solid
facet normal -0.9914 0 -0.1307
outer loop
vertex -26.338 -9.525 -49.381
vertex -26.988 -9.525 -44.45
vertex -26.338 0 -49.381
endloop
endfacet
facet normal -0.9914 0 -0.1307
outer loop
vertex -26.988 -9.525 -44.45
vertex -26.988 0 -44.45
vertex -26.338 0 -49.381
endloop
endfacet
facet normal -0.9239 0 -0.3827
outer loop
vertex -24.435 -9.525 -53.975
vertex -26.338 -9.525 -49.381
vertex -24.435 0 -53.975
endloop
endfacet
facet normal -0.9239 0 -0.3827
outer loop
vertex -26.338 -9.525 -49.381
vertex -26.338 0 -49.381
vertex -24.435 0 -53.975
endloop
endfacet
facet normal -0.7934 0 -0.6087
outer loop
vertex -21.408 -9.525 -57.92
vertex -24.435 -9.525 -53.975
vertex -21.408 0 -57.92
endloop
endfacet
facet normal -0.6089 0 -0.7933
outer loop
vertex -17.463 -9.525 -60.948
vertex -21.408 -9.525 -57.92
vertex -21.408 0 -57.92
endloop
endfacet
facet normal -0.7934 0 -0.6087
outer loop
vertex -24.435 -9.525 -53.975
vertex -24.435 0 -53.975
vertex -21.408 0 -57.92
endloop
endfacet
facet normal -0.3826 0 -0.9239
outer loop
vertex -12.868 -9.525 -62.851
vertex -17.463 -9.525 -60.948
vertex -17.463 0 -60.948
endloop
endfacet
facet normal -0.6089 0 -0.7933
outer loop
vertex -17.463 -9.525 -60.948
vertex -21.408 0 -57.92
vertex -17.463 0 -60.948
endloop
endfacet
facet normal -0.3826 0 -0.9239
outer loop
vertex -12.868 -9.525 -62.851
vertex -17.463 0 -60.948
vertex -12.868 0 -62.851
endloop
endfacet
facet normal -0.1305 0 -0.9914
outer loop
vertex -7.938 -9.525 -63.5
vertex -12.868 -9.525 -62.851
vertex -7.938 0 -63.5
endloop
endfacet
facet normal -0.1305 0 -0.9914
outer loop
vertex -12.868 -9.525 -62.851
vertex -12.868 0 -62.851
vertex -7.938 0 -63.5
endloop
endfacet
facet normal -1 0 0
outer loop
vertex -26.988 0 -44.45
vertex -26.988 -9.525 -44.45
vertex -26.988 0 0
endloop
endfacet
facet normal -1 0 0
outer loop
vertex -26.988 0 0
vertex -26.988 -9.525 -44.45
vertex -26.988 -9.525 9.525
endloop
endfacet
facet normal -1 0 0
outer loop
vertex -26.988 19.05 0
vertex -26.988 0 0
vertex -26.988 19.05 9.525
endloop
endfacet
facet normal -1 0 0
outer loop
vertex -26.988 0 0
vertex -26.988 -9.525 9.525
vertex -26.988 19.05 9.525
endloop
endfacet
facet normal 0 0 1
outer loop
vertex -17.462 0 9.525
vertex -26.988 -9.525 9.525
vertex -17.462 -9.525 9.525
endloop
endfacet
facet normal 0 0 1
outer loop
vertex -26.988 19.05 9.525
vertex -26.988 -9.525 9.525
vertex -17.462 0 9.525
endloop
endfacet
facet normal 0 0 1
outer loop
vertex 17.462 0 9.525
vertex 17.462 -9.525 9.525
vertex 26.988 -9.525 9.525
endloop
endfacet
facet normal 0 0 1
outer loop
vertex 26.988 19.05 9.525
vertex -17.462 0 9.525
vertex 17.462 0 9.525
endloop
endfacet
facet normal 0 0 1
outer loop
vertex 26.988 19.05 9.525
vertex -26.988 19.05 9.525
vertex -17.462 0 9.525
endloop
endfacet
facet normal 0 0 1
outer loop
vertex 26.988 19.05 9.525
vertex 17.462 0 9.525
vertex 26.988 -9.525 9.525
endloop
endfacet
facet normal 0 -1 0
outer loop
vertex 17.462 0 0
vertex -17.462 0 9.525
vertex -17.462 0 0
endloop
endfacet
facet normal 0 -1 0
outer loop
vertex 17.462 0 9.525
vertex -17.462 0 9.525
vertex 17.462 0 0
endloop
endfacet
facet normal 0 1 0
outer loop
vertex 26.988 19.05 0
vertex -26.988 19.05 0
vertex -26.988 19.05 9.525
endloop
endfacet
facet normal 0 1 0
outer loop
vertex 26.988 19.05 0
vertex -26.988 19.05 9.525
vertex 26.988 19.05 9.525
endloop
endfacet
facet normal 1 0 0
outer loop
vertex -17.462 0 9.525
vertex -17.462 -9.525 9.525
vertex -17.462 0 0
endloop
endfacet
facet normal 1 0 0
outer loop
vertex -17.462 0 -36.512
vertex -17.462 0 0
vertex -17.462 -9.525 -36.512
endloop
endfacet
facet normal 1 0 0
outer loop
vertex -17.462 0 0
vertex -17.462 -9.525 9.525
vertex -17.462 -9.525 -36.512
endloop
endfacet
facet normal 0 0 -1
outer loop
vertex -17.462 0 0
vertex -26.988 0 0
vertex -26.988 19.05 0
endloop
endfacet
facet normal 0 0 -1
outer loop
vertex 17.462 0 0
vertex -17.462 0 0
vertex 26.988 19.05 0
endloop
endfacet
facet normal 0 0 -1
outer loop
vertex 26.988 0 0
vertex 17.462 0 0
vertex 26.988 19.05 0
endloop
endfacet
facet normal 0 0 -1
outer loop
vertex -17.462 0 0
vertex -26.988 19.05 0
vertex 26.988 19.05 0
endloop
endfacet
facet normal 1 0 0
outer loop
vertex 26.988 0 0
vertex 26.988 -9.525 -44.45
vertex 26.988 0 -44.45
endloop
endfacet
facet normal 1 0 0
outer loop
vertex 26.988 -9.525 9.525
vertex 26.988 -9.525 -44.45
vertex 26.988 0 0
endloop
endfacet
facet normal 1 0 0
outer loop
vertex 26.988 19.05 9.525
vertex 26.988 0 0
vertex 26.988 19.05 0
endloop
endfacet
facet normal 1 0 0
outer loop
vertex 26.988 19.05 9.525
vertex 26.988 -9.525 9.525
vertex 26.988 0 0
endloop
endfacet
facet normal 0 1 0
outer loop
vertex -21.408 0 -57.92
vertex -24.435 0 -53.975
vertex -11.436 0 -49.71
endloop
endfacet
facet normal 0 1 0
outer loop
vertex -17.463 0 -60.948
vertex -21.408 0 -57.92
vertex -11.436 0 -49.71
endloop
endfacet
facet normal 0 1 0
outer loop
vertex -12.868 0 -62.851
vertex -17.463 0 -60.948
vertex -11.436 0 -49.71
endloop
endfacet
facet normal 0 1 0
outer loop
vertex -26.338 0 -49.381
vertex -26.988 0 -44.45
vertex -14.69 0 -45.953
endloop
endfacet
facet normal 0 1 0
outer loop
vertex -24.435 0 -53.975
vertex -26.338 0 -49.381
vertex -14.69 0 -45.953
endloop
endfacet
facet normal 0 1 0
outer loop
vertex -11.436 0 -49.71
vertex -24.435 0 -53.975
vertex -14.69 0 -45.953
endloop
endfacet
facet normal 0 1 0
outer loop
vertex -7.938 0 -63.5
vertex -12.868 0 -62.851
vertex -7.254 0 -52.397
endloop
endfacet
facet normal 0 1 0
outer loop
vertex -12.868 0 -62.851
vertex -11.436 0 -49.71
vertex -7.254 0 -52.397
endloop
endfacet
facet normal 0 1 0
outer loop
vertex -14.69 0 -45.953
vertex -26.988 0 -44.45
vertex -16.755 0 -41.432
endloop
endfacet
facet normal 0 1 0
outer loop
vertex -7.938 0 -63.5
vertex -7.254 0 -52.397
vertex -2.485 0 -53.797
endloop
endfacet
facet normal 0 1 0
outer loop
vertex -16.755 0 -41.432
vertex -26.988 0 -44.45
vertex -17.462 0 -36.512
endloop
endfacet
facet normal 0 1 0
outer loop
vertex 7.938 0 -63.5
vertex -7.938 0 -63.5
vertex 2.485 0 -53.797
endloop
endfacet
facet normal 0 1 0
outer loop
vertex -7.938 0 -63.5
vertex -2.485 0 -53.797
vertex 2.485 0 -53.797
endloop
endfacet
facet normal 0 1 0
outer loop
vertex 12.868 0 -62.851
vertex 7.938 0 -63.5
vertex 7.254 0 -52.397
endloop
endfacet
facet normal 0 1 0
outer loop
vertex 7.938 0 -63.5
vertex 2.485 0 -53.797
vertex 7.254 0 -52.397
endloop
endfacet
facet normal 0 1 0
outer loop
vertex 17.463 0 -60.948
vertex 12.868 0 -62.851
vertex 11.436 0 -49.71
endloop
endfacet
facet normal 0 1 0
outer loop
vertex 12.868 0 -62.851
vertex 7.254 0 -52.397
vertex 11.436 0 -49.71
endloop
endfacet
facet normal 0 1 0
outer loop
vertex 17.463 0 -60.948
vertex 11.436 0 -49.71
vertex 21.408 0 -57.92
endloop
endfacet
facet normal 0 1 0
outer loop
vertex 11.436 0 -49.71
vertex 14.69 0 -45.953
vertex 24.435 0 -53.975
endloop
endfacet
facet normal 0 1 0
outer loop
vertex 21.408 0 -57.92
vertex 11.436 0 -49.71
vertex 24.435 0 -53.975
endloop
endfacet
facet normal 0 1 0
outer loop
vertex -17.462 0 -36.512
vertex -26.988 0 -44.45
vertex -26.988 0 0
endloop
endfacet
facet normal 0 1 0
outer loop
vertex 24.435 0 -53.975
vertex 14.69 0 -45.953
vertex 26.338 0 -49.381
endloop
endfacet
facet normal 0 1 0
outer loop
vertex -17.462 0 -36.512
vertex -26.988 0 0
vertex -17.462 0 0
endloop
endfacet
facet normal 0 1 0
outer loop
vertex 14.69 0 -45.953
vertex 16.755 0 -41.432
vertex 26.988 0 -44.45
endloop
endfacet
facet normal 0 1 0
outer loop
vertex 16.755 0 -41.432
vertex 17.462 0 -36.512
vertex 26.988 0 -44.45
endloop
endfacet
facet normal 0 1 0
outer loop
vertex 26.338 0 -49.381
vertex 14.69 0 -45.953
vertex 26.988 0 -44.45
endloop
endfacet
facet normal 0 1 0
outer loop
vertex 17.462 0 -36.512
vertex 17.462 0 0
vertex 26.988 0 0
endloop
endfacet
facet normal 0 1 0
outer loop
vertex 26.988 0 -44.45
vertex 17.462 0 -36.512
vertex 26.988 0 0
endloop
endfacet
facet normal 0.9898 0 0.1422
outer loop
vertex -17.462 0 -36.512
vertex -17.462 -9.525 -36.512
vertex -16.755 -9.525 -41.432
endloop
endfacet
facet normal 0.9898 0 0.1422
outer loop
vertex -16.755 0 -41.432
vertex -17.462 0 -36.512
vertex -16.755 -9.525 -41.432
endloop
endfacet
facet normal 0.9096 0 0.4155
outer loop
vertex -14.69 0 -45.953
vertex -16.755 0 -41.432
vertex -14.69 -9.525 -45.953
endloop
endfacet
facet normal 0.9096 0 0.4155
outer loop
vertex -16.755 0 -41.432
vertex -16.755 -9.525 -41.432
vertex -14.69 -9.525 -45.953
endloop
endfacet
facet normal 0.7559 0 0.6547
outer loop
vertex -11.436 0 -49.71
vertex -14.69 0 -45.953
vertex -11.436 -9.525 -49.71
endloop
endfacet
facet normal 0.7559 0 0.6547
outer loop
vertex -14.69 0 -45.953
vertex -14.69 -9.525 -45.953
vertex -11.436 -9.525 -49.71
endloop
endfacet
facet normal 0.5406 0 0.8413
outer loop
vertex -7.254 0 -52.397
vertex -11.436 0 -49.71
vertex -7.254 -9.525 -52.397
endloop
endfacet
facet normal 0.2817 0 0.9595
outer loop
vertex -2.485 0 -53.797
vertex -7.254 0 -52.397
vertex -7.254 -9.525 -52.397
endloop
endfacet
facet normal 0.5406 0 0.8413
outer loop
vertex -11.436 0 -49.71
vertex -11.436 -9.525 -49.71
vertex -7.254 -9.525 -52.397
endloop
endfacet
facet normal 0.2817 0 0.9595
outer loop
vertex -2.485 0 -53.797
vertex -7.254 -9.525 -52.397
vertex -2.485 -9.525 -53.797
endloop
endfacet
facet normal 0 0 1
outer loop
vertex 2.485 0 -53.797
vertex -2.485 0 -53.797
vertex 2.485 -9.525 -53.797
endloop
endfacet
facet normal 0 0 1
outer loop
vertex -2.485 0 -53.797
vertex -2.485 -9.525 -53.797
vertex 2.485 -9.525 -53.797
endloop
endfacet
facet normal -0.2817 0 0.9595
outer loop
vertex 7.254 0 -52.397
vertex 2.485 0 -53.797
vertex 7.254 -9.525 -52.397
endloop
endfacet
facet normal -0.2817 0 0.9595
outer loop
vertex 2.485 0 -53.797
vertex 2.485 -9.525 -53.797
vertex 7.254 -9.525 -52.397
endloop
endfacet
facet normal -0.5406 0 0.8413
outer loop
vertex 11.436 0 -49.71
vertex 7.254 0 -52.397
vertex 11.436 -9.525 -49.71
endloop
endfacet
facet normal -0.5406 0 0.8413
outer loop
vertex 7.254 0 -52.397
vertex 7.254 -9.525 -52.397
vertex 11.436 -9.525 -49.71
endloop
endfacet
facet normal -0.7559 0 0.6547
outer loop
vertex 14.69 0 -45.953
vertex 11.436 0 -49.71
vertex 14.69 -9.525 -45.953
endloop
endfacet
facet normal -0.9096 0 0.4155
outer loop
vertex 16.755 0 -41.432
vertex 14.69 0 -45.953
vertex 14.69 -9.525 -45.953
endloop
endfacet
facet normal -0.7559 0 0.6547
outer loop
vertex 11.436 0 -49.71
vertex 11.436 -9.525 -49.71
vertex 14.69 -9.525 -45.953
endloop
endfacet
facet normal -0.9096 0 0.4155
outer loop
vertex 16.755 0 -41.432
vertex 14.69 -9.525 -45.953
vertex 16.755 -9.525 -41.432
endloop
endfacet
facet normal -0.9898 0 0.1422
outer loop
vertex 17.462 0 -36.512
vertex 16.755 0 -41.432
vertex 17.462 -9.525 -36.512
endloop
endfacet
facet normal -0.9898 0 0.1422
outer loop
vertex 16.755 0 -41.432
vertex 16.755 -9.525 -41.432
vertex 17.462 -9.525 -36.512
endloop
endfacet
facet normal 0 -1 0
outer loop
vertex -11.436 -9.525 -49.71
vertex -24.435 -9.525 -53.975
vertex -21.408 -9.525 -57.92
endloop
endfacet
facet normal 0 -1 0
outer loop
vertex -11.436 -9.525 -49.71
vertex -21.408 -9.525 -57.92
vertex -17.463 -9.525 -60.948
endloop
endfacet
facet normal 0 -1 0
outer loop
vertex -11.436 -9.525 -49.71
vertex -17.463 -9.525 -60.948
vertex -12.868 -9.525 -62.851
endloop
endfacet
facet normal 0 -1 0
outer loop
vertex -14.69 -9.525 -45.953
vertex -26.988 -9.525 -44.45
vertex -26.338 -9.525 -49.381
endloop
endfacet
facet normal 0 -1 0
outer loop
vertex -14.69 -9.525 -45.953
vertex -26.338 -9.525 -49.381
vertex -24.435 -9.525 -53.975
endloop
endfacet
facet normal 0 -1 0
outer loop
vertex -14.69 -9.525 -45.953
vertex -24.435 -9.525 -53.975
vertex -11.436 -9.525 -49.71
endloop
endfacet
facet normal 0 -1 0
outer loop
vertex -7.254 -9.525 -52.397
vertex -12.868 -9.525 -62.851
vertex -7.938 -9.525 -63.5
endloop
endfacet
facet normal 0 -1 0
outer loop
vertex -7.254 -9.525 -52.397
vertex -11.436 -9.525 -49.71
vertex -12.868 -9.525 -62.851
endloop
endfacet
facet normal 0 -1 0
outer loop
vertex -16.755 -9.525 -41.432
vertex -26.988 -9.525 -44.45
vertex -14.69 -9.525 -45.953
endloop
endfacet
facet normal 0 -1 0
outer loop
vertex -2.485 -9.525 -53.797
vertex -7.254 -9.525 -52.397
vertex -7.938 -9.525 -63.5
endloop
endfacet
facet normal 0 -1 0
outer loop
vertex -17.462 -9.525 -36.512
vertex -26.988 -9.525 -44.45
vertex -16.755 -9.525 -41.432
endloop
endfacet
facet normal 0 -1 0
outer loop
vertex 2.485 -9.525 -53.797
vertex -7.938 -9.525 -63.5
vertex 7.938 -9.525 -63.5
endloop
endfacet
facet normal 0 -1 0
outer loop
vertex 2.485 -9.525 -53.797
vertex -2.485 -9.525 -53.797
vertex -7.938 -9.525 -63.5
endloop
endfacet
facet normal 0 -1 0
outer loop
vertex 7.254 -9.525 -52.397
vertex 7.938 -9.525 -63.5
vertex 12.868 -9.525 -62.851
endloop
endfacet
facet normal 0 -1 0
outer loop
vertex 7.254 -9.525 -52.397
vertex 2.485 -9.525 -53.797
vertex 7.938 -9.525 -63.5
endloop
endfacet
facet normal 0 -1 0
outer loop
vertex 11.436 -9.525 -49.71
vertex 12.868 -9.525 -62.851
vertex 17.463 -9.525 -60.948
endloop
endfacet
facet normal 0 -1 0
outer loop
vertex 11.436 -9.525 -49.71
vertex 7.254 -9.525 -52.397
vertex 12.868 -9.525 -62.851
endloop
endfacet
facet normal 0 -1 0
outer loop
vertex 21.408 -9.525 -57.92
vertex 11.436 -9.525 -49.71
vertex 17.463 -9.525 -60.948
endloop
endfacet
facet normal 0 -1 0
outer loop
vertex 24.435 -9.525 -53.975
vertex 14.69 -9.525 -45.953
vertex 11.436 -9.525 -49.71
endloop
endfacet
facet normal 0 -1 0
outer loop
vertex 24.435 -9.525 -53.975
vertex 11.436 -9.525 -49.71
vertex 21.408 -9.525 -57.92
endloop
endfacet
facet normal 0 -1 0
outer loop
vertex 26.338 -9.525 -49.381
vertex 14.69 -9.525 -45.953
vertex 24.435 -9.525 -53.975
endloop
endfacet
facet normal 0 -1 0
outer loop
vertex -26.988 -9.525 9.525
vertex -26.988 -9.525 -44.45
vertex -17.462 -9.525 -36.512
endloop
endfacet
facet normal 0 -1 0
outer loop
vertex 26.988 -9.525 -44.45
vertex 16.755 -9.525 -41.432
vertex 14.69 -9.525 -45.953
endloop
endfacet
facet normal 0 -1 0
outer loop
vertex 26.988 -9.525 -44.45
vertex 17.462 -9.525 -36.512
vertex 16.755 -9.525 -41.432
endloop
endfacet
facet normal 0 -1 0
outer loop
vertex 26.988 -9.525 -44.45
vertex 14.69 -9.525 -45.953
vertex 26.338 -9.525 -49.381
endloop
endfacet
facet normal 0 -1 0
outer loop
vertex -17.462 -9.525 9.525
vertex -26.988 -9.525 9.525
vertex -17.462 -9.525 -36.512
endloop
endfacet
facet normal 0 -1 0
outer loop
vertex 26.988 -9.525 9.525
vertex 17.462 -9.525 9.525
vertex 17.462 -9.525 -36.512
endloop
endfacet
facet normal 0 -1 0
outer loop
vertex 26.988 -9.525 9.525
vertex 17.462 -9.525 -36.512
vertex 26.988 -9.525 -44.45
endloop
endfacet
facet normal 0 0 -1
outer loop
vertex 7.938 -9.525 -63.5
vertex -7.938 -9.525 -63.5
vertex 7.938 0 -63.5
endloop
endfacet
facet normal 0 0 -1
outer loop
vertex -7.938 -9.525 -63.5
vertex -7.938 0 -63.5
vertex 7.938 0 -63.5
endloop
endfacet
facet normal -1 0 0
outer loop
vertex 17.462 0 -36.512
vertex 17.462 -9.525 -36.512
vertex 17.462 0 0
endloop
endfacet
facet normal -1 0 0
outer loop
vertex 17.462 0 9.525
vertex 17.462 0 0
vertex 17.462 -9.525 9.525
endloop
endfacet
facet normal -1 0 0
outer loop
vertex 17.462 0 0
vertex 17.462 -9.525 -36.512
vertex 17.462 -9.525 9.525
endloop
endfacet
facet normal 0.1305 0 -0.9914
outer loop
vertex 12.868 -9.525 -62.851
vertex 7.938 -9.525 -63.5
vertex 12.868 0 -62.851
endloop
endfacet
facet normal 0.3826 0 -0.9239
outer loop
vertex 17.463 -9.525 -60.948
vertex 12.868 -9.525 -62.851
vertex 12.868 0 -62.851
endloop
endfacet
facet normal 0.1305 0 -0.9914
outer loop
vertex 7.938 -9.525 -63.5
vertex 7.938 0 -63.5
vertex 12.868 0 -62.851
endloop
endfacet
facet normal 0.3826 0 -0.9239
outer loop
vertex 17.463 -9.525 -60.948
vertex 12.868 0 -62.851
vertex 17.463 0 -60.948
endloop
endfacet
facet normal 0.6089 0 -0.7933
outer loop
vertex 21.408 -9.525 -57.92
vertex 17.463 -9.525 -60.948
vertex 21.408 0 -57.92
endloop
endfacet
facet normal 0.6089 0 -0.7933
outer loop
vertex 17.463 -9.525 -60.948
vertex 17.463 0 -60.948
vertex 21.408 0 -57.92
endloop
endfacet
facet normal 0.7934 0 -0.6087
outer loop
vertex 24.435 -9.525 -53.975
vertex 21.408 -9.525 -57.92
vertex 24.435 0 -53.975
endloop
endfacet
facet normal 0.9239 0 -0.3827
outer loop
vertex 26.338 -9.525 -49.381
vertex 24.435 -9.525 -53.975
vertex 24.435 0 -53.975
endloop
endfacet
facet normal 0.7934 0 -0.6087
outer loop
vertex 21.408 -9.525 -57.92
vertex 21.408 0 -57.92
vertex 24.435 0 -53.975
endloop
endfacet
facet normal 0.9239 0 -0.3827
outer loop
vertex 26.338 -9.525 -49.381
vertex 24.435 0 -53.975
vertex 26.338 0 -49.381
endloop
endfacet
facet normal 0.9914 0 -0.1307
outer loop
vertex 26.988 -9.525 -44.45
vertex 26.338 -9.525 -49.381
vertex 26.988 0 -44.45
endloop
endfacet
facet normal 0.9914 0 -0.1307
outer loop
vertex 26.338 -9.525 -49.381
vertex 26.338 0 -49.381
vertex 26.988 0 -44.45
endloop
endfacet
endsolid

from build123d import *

# Parameters (mm, degrees)
F0_W          = 53.975
F0_H          = 19.05
F1_DEPTH      = 9.525
F2_W          = 53.975
F2_H          = 9.525
F3_DEPTH      = 9.525
F3_DEPTH_BACK = 63.5
F5_DEPTH      = 9.525
F6_R          = 19.05


with BuildPart() as f1:
    # F0 (on Top) → F1 (new body)
    with BuildSketch(Plane.XY):
        with Locations((0, 9.525)):
            Rectangle(F0_W, F0_H)
    extrude(amount=F1_DEPTH)

    # F2 (on Top) → F3 (join, two sides)
    with BuildSketch(Plane.XY) as f3_sk:
        with Locations((0, -4.7625)):
            Rectangle(F2_W, F2_H)
    extrude(amount=F3_DEPTH)
    extrude(f3_sk.sketch, amount=-F3_DEPTH_BACK)

    # F4 (on face) → F5 (cut)
    with BuildSketch(Plane.XZ.offset(9.525)):
        with BuildLine():
            Line((17.4625, 9.525), (-17.4625, 9.525))
            Line((-17.4625, 9.525), (-17.4625, -36.5125))
            ThreePointArc((-17.4625, -36.5125), (0, -53.975), (17.4625, -36.5125))
            Line((17.4625, -36.5125), (17.4625, 9.525))
        make_face()
    extrude(amount=-F5_DEPTH, mode=Mode.SUBTRACT)

    # F6
    f6_edges = [f1.edges().sort_by_distance(p)[0] for p in [
        (26.9875, -4.7625, -63.5),
        (-26.9875, -4.7625, -63.5),
    ]]
    fillet(f6_edges, radius=F6_R)


solid = f1.part
